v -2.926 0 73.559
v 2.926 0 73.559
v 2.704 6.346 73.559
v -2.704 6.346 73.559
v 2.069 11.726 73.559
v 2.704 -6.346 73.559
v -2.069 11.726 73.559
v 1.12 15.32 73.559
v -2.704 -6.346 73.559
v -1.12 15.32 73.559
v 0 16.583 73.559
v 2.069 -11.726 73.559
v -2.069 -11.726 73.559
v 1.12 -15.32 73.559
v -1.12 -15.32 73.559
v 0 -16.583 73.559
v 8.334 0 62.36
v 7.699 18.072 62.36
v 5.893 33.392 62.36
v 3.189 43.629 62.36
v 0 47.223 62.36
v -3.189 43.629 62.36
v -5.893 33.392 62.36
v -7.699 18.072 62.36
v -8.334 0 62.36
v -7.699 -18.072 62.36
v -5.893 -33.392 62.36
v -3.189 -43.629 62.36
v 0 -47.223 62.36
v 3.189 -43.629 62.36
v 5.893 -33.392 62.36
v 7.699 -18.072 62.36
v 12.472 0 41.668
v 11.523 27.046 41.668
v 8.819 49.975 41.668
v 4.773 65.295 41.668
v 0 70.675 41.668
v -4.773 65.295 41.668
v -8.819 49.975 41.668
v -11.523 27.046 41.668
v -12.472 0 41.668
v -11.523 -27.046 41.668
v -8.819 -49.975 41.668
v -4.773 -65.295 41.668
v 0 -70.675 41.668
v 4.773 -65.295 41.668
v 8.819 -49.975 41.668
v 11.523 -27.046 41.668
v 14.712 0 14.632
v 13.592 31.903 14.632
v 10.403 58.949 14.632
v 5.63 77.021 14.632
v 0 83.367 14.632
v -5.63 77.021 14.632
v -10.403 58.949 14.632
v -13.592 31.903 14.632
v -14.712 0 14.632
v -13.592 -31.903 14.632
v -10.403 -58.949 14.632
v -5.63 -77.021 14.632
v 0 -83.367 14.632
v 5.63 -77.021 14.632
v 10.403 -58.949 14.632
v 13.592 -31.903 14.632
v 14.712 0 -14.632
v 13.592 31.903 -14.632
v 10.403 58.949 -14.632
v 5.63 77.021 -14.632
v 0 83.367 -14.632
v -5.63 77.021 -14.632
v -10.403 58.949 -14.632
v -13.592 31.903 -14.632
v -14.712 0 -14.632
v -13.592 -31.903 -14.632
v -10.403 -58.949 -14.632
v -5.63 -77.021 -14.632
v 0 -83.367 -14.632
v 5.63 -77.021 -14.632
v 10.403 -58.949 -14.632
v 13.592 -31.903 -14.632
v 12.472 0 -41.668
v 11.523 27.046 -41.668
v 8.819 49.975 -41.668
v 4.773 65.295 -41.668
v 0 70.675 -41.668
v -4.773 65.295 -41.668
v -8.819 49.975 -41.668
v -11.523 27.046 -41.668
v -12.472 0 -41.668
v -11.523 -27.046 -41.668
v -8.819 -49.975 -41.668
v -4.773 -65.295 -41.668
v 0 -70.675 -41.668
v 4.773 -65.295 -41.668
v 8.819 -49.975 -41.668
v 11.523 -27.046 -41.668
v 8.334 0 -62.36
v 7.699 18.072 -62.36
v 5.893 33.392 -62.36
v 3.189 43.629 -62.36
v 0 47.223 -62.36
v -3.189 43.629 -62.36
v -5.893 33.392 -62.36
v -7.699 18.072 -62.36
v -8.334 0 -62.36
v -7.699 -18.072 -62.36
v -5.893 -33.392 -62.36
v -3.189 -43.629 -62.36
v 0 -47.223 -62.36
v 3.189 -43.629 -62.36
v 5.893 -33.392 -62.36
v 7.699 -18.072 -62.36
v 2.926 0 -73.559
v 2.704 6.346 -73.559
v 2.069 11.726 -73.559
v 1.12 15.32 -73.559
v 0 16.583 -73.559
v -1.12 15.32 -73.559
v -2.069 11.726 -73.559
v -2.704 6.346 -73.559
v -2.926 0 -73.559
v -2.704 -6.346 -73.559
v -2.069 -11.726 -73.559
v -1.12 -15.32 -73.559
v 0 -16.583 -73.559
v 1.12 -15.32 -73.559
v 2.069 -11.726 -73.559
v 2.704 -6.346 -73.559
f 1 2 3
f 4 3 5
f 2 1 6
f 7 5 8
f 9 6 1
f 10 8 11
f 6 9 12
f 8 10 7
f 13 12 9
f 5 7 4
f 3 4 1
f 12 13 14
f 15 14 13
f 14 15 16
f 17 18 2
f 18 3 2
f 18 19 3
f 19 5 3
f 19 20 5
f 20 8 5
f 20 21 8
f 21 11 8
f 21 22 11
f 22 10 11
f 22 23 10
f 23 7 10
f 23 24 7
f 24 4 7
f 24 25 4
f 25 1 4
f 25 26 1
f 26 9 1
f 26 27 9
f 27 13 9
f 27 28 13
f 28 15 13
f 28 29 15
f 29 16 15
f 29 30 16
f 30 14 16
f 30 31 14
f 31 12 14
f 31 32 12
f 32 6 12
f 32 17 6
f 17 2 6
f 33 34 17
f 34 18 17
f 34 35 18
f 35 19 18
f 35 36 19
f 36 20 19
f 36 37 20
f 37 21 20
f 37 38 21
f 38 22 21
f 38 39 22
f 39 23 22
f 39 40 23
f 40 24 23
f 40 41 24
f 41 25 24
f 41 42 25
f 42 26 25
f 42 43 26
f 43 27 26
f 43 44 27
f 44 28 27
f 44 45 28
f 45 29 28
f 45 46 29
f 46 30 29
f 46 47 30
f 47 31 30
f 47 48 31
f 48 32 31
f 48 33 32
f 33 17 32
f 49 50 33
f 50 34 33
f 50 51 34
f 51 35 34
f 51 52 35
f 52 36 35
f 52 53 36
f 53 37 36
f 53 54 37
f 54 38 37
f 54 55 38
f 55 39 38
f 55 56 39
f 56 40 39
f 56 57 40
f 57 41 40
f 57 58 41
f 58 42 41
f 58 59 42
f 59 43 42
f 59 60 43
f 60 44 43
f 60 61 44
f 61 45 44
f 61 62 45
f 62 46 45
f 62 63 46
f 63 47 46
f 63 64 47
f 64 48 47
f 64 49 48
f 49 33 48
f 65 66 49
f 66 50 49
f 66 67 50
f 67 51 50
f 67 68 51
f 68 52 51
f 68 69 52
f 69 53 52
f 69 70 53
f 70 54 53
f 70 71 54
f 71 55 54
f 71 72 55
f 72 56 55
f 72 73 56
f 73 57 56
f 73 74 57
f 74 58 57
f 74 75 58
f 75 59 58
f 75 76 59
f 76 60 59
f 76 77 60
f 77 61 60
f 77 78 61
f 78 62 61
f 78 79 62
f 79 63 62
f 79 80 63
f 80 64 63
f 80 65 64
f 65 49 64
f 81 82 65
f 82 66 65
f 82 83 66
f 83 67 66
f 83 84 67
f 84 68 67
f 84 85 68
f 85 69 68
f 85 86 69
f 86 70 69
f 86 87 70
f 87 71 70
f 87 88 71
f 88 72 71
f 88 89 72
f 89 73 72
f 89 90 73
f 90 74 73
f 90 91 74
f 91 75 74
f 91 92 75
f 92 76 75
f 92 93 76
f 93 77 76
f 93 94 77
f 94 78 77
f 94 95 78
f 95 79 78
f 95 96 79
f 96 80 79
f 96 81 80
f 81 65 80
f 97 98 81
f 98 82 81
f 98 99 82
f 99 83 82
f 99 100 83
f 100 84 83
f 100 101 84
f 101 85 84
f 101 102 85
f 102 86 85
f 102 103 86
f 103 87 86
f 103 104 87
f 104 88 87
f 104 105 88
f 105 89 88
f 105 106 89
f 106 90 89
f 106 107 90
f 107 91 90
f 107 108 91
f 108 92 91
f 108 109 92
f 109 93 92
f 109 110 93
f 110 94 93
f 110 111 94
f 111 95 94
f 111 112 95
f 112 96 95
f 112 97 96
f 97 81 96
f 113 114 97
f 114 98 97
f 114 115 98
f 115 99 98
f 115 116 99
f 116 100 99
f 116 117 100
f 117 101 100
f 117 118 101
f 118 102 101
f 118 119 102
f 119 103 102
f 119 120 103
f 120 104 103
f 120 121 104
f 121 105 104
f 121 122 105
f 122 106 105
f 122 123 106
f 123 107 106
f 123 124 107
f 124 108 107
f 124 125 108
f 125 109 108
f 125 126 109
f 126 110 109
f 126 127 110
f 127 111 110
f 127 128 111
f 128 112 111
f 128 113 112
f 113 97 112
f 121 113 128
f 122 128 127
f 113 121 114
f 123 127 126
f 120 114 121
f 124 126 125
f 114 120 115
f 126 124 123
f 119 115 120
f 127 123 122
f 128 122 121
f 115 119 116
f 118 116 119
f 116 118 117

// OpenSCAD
// Generated by SolidPython 1.0.1 on 2020-07-29 00:46:46


scale(v = [3, 17, 15]) {
	sphere(r = 5);
}
/***********************************************
*********      SolidPython code:      **********
************************************************
 
# import packages: SolidPython
from solid import *
from solid.utils import *
from itertools import chain, combinations, permutations


class Resize:

    def __init__(self, scad_file):
        self.scad_file = scad_file
        #self.scad_file = import_scad(scad_file)
        # cone/cylinder param:
        self.r1 = 0
        self.r2 = 0
        self.h = 0
        # rectangular prism param:
        self.w = 0
        self.l = 0
        # ellipse param:
        self.r = 0

    # import OpenScad code (file name corresponds to shape)


    # classify shape + parameters
    def assign(self, param1, param2, param3):
        if self.scad_file == 'cone.scad':
            self.r1 = param1
            self.r2 = param2
            self.h = param3
        elif self.scad_file == 'cylinder.scad':
            self.r1 = param1
            self.r2 = param2
            self.h = param3
        elif self.scad_file == 'rectangularPrism.scad':
            self.h = param1
            self.l = param2
            self.w = param3
        else:
            self.r = param1
            self.h = param2

    # resize parameters
    def iterate(self):
        x = range(3, 20, 2)
        i = 1
        if self.scad_file == 'cone.scad':
            tempList = list(permutations(x, 2))
            for temp in tempList:
                param1 = temp[0]
                param2 = temp[1]
                filepath = 'produced_scad_files/' + 'cone' + str(param1) + '_' + str(param2) + '_' + '.scad'
                scad_render_to_file(cylinder(h=param1, r1=param2, r2=0), filepath)

        elif self.scad_file == 'cylinder.scad':
            tempList = list(permutations(x, 3))
            for temp in tempList:
                param1 = temp[0]
                param2 = temp[1]
                filepath = 'produced_scad_files/' + 'cylinder' + str(param1) + '_' + str(param2) + '_' + '.scad'
                scad_render_to_file(cylinder(h=param1, r1=param2, r2=param2), filepath)

        elif self.scad_file == 'rectangularPrism.scad':
            tempList = list(permutations(x, 3))
            for temp in tempList:
                param1 = temp[0]
                param2 = temp[1]
                param3 = temp[2]
                filepath = 'produced_scad_files/' + 'rectangularPrism' + str(param1) + '_' + str(param2) + '_' + str(
                    param3) + '.scad'
                scad_render_to_file(cube(size=(param1, param2, param3)), filepath)

        elif self.scad_file == 'ellipse.scad':
            tempList = list(permutations(x, 4))
            for temp in tempList:
                param1 = temp[0]
                param2 = temp[1]
                param3 = temp[2]
                param4 = temp[3]
                filepath = 'produced_scad_files/' + 'ellipse' + str(param1) + '_' + str(param2) + '_' + str(param3) + '_' + str(param4) + '.scad'
                scad_render_to_file(scale([param1, param2, param3])(sphere(r=param4)), filepath)

    def render_to_scadfile(self):
        scad_render_to_file(scad, 'example.scad') 
 
************************************************/
